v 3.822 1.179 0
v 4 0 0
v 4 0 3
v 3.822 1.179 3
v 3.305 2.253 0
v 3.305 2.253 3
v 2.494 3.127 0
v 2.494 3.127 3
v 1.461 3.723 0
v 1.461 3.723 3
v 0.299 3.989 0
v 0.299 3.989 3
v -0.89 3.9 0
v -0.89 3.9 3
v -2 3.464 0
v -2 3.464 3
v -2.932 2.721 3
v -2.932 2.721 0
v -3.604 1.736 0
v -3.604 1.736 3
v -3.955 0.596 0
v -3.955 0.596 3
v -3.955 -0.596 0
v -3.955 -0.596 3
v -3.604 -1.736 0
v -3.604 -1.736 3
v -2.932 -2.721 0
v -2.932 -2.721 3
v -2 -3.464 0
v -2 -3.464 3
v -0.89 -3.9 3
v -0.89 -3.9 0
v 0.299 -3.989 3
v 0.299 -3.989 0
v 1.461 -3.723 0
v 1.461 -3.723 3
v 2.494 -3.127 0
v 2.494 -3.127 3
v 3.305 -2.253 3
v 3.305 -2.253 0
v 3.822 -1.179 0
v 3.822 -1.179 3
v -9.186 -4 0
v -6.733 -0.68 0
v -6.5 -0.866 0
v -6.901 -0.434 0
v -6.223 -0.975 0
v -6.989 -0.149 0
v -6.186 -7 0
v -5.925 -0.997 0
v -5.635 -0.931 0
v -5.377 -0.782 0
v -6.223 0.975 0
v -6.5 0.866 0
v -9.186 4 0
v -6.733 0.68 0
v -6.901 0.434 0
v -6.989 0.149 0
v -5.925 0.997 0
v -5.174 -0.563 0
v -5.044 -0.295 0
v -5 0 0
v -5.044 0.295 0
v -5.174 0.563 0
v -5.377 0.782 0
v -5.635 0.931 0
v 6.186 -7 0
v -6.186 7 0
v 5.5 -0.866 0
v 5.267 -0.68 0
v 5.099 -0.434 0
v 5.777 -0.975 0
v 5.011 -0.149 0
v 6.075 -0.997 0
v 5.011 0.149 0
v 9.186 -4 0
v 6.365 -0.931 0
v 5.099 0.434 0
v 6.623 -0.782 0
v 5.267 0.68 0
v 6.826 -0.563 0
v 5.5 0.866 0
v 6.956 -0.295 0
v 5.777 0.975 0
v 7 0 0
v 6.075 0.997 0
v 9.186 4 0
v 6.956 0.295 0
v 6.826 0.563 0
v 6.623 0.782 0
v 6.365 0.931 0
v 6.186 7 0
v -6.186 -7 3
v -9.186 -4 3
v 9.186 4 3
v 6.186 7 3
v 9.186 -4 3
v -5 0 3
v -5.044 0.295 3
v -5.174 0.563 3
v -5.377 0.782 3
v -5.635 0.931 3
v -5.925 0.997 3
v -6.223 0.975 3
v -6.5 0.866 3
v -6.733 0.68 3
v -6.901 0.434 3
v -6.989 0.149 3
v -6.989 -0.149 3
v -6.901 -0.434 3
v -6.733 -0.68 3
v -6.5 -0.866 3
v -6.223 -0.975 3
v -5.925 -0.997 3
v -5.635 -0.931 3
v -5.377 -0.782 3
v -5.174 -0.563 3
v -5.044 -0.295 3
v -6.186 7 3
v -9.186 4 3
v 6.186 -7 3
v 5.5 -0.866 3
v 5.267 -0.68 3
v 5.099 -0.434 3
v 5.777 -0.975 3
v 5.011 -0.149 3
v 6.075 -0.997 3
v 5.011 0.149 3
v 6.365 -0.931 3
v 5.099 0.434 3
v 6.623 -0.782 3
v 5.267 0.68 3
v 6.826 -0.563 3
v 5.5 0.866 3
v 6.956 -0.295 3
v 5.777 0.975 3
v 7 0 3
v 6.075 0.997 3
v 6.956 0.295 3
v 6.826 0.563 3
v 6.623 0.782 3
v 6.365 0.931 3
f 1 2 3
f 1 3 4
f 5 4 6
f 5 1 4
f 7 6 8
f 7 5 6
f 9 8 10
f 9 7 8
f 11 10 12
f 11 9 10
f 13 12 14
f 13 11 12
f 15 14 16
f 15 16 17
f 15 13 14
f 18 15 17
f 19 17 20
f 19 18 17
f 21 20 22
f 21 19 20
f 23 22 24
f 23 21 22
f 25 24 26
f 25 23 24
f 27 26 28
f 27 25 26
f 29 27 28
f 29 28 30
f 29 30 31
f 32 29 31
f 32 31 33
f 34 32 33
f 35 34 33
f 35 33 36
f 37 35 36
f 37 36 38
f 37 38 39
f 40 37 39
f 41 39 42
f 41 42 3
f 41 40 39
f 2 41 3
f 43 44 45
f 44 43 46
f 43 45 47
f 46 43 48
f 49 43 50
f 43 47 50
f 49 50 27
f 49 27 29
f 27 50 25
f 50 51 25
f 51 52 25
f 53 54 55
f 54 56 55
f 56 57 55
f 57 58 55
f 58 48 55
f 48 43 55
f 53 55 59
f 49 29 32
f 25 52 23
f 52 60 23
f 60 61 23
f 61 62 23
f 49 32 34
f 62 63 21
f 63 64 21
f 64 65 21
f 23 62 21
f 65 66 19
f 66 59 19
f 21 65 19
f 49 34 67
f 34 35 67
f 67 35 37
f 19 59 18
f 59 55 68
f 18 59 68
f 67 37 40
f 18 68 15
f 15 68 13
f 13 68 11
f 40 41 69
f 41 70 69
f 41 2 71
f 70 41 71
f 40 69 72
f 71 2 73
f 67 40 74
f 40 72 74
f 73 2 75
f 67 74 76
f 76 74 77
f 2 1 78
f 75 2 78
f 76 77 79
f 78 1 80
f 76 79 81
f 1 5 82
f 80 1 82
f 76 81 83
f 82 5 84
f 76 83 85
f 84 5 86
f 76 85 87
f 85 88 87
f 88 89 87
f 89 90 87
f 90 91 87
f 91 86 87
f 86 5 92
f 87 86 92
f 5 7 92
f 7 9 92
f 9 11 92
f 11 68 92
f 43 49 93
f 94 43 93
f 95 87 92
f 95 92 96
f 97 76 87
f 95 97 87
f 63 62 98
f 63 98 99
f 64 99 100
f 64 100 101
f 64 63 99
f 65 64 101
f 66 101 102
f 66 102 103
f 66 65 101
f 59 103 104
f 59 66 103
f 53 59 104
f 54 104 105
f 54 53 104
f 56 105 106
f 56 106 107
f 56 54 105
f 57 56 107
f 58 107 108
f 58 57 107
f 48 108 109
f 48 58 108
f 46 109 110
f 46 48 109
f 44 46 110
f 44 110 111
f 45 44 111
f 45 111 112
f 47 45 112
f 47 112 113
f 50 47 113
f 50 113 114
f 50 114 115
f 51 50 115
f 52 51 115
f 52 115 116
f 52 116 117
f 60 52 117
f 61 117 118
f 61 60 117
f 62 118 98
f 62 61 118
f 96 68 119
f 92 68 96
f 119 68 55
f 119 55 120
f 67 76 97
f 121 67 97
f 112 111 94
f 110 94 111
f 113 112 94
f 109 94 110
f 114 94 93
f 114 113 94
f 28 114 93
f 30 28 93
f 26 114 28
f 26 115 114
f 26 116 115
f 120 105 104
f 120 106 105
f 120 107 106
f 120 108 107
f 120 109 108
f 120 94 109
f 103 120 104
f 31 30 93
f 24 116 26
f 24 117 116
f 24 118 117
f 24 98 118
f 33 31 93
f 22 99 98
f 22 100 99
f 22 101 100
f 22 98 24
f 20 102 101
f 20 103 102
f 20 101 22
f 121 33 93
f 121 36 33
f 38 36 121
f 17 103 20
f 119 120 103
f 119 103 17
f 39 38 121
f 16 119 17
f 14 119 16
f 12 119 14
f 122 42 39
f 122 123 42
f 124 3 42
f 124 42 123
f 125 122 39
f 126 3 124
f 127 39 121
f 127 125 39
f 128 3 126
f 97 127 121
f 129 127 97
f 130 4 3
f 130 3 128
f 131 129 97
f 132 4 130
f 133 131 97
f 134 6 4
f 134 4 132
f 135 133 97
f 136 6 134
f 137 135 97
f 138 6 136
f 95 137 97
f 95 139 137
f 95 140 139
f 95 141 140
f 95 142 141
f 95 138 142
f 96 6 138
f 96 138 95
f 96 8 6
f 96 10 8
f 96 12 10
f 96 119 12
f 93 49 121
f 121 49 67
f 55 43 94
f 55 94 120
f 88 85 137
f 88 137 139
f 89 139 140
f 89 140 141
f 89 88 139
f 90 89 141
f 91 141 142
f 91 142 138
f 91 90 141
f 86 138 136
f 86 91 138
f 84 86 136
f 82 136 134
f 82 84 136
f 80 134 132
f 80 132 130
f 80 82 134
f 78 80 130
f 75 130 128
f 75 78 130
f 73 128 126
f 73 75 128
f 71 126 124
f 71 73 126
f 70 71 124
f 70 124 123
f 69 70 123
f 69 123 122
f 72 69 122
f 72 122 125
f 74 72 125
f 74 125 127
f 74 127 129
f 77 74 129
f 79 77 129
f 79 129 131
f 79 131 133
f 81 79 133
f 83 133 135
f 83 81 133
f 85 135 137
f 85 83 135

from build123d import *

# Parameters (mm, degrees)
SKETCH1_W           = 18.372011154
SKETCH1_H           = 14
SKETCH1_R           = 1
SKETCH1_R_2         = 4
BOSS_EXTRUDE1_DEPTH = 3
CHAMFER1_SIZE       = 3


with BuildPart() as part:
    # Sketch1 → Boss-Extrude1 (new body)
    with BuildSketch(Plane.XY):
        Rectangle(SKETCH1_W, SKETCH1_H)
        with Locations((-6, 0)):
            Circle(SKETCH1_R, mode=Mode.SUBTRACT)
        with Locations((6, 0)):
            Circle(SKETCH1_R, mode=Mode.SUBTRACT)
        Circle(SKETCH1_R_2, mode=Mode.SUBTRACT)
    extrude(amount=BOSS_EXTRUDE1_DEPTH)

    # Chamfer1
    chamfer1_edges = [part.edges().sort_by_distance(p)[0] for p in [
        (9.186005577, -7, 1.5),
        (-9.186005577, -7, 1.5),
        (-9.186005577, 7, 1.5),
        (9.186005577, 7, 1.5),
    ]]
    chamfer(chamfer1_edges, length=CHAMFER1_SIZE)


solid = part.part
